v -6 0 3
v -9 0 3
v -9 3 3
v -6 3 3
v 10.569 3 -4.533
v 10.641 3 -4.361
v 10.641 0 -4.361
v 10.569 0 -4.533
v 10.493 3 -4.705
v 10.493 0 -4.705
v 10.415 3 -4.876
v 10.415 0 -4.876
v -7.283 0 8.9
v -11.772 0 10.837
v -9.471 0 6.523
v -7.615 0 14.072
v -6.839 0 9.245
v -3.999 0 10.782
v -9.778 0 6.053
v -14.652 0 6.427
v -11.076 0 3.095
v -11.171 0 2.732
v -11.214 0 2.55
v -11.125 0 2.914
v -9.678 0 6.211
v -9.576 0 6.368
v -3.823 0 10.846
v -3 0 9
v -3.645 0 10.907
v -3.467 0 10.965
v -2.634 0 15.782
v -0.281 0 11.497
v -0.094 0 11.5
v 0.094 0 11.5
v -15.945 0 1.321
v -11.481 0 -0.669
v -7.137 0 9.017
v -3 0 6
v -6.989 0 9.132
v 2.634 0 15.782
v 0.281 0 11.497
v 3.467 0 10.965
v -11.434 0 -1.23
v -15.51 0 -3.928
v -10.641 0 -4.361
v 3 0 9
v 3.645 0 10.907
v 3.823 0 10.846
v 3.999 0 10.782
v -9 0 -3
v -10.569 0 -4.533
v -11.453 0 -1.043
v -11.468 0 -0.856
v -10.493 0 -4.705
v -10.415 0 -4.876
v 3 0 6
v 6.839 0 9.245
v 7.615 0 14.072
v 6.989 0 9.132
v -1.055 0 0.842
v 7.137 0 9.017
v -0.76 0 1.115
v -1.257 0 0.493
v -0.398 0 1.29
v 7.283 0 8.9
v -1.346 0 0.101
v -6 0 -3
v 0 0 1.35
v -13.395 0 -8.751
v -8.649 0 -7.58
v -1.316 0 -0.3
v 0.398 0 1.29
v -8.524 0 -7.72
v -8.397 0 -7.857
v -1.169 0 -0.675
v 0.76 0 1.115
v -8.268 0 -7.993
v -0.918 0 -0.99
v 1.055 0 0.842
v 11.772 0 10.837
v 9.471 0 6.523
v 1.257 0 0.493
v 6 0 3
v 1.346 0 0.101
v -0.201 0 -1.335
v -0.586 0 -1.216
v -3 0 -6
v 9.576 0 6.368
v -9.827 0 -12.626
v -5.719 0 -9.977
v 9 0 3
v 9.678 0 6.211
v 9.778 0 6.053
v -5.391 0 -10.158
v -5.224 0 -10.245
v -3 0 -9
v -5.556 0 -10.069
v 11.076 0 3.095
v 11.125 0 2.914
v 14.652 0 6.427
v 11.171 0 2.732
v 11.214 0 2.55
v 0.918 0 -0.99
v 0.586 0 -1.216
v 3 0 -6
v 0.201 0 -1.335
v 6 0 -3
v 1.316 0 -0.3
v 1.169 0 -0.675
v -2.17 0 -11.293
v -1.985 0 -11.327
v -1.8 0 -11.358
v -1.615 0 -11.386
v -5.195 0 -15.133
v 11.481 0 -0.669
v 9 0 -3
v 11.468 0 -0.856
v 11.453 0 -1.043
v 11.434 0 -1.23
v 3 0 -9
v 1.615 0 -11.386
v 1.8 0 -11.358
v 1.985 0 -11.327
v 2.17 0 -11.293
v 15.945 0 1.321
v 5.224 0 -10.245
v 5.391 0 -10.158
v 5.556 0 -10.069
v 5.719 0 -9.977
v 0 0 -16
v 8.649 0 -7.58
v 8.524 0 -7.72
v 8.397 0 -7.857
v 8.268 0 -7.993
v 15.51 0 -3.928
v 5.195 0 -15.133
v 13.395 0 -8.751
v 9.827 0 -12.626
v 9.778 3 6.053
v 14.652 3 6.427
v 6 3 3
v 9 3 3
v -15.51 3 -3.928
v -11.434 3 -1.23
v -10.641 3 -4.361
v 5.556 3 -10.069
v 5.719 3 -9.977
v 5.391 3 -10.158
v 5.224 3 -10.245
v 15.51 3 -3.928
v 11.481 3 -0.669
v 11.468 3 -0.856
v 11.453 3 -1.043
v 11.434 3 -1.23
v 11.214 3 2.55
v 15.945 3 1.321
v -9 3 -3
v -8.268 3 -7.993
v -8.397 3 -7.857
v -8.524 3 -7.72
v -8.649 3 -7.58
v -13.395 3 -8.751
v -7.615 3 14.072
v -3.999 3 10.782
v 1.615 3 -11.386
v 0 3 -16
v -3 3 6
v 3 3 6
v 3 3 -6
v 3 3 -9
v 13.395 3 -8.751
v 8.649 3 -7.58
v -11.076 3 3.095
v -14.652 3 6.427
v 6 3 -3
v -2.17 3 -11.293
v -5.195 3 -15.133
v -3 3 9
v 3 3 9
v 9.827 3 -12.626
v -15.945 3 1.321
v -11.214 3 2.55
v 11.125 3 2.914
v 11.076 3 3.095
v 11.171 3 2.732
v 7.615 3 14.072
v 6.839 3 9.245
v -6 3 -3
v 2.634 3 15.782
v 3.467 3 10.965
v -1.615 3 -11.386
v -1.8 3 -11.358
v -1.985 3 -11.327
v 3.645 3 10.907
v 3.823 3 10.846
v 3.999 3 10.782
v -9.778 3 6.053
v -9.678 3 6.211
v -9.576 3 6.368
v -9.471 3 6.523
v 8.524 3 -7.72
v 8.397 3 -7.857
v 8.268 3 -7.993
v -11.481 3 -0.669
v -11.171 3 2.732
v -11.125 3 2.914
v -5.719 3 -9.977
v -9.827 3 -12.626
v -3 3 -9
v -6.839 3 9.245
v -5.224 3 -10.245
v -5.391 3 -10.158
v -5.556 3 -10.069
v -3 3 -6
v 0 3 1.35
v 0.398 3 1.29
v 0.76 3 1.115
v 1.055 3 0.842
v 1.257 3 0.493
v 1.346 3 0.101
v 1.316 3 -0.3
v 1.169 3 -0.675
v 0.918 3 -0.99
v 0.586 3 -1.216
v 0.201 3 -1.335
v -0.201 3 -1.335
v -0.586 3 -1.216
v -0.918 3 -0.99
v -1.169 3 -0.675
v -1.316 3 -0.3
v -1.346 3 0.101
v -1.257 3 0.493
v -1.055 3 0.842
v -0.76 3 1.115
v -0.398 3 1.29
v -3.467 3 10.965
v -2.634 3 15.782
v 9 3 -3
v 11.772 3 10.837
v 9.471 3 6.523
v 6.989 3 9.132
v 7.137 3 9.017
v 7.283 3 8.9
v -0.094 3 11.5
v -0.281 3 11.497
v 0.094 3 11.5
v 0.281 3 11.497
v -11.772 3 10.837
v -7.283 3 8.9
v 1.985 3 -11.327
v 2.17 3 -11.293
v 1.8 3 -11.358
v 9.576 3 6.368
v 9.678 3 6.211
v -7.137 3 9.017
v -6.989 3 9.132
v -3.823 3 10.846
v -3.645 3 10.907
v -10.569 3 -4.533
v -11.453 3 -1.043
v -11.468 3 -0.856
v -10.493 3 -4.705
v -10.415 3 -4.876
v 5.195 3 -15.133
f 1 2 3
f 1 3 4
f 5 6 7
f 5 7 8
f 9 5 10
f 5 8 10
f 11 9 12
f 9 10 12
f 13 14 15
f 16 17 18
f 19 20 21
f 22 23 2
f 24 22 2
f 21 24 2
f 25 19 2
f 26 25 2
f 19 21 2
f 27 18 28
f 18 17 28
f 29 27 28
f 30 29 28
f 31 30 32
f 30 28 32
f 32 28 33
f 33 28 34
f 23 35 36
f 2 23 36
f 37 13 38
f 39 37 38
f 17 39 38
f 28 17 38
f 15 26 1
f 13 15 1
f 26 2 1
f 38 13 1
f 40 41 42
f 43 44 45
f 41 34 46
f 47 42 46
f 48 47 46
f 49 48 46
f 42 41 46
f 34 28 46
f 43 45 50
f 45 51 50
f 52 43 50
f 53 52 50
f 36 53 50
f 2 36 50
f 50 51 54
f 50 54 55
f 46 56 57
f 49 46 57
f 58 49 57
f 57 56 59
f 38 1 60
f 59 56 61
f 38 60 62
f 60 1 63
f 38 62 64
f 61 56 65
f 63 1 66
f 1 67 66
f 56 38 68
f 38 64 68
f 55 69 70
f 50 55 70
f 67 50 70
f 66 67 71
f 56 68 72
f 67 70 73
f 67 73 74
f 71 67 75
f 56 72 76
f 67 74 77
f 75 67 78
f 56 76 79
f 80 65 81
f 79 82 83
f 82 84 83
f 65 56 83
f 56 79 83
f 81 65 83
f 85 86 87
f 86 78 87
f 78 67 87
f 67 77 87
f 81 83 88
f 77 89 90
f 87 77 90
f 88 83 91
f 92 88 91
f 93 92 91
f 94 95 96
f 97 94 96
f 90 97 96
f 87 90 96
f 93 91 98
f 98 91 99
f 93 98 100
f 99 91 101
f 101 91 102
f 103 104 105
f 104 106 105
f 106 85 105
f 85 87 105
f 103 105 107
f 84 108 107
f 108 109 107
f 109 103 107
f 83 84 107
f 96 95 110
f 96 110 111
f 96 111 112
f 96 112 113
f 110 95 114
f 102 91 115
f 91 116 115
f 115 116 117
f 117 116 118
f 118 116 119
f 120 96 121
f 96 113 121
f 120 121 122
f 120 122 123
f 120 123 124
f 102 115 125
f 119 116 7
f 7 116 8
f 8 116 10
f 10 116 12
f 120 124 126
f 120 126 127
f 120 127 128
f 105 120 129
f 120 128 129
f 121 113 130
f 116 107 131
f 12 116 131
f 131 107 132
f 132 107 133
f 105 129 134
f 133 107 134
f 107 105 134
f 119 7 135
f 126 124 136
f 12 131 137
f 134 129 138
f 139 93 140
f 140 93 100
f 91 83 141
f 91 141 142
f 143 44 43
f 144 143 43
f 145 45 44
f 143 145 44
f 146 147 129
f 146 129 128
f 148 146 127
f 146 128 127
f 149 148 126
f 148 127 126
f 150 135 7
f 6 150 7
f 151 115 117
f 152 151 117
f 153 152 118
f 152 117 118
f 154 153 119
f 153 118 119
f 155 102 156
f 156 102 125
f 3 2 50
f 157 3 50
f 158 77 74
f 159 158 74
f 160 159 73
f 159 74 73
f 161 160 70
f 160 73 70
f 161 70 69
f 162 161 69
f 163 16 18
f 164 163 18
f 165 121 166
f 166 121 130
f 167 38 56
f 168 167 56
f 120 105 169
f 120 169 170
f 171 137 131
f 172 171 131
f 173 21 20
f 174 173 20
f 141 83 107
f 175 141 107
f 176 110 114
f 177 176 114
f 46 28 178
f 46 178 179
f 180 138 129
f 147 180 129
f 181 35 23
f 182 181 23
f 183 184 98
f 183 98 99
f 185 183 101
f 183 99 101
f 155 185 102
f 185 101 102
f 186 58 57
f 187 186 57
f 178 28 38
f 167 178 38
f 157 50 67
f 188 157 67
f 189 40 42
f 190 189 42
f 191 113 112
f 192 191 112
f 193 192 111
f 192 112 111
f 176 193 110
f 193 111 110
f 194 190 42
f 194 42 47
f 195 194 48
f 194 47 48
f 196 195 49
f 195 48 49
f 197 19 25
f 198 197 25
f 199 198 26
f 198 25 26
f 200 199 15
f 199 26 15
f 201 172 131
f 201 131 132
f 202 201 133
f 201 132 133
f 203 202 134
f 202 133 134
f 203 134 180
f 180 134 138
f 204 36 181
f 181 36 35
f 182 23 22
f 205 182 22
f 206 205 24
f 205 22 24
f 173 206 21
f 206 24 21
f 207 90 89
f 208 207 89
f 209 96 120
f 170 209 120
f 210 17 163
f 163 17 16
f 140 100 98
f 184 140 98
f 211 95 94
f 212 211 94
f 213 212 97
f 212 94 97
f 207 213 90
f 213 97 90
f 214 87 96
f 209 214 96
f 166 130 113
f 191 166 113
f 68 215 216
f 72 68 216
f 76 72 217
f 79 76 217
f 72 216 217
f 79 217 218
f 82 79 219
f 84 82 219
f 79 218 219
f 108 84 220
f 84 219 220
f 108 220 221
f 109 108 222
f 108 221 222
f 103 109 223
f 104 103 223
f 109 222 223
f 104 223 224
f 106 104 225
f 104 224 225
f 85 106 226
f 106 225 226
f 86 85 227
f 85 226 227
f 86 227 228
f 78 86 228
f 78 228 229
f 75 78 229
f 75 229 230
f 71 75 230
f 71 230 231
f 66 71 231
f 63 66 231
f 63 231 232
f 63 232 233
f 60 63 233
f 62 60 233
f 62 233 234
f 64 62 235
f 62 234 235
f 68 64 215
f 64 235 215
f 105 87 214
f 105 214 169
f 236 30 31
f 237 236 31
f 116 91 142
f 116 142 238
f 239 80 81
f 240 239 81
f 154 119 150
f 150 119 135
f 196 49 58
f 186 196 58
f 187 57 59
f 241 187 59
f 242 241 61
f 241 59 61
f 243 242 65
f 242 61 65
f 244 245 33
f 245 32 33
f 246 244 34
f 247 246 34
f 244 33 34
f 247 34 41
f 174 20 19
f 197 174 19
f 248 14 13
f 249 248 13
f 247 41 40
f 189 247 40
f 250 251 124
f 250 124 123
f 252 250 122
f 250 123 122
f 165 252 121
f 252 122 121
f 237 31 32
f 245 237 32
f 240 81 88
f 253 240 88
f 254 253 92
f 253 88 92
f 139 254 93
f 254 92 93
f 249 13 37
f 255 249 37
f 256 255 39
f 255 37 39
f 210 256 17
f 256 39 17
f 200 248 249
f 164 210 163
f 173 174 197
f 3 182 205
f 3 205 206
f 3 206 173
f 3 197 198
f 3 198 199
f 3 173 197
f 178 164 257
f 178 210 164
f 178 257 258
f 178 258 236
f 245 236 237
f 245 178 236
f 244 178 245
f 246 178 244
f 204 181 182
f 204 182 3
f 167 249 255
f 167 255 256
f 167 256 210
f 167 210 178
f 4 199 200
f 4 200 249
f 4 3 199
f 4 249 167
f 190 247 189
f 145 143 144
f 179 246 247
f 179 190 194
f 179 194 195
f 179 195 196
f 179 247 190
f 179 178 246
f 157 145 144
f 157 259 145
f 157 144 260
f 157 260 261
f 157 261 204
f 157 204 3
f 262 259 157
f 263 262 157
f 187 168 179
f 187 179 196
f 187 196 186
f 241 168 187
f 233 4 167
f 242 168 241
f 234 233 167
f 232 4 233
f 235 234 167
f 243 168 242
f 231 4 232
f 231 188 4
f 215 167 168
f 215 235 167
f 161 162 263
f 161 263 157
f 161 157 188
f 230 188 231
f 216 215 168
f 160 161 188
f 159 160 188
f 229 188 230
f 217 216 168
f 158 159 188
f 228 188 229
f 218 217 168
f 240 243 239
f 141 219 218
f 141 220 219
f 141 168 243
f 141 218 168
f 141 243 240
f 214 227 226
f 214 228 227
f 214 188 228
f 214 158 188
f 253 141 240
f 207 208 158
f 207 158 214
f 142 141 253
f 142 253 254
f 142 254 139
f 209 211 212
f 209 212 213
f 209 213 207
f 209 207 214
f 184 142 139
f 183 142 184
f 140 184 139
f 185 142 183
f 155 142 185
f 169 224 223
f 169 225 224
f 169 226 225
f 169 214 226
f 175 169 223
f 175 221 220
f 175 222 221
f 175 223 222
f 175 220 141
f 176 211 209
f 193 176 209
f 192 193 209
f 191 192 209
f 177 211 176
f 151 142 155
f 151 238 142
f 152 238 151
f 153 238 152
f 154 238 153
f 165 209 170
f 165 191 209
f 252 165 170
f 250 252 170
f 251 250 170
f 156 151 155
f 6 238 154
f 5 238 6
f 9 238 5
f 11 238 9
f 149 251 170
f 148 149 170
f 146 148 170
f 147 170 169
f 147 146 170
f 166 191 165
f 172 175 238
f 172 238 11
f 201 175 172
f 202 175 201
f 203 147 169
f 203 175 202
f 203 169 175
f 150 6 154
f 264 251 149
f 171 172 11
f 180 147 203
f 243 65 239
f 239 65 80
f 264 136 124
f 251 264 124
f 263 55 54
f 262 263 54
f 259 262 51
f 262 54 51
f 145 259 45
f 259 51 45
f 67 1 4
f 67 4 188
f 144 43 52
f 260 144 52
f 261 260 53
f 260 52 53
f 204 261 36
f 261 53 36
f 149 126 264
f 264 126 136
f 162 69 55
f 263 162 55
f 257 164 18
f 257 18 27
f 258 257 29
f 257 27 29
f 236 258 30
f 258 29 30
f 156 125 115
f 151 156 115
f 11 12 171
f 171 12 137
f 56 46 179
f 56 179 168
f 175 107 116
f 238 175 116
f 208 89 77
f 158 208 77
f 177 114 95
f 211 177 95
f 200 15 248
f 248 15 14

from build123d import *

# Parameters (mm, degrees)
SKETCH5_R           = 11.5
BOSS_EXTRUDE2_DEPTH = 3
BOSS_EXTRUDE1_DEPTH = 3
SKETCH3_W           = 6
SKETCH3_H           = 3
SKETCH3_W_2         = 3
SKETCH3_H_2         = 6
CUT_EXTRUDE1_DEPTH  = 3
SKETCH6_R           = 1.35
CUT_EXTRUDE3_DEPTH  = 3


with BuildPart() as part:
    # Sketch5 → Boss-Extrude2 (new body)
    with BuildSketch(Plane(origin=(0, 0, 0), x_dir=(1, 0, 0), z_dir=(0, 1, 0))):
        with Locations(Location((0, 0, 0), (0, 0, 270))):
            Circle(SKETCH5_R)
    extrude(amount=BOSS_EXTRUDE2_DEPTH)

    # Sketch1 → Boss-Extrude1 (add)
    with BuildSketch(Plane(origin=(0, 0, 0), x_dir=(1, 0, 0), z_dir=(0, 1, 0))):
        Polygon((0, 16), (-1.75, 11), (1.75, 11), align=None)
        Polygon((5.195191507, 15.133075867), (1.916513988, 10.97221373), (5.226874334, 9.835765588), align=None)
        Polygon((9.827403403, 12.62624815), (5.375343948, 9.755417851), (8.137335731, 7.605673356), align=None)
        Polygon((13.394663652, 8.75117053), (8.251671984, 7.481471076), (10.165990538, 4.551388402), align=None)
        Polygon((15.510404255, 3.927767794), (10.233803323, 4.396790824), (11.093002528, 1.003889893), align=None)
        Polygon((15.945351888, -1.321269528), (11.106943278, 0.835650063), (10.817915568, -2.652395663), align=None)
        Polygon((14.652373226, -6.427126794), (10.776473586, -2.81604635), (9.3705396, -6.021252993), align=None)
        Polygon((11.771582571, -10.836505146), (9.278205768, -6.162580444), (6.907720267, -8.737614132), align=None)
        Polygon((7.615158289, -14.071580019), (6.774500388, -8.841303325), (3.696342259, -10.507119201), align=None)
        Polygon((2.633513444, -15.781780854), (3.536672774, -10.561933804), (0.084408212, -11.13801487), align=None)
        Polygon((-2.633513444, -15.781780854), (-0.084408212, -11.13801487), (-3.536672774, -10.561933804), align=None)
        Polygon((-7.615158289, -14.071580019), (-3.696342259, -10.507119201), (-6.774500388, -8.841303325), align=None)
        Polygon((-11.771582571, -10.836505146), (-6.907720267, -8.737614132), (-9.278205768, -6.162580444), align=None)
        Polygon((-14.652373226, -6.427126794), (-9.3705396, -6.021252993), (-10.776473586, -2.81604635), align=None)
        Polygon((-15.945351888, -1.321269528), (-10.817915568, -2.652395663), (-11.106943278, 0.835650063), align=None)
        Polygon((-15.510404255, 3.927767794), (-11.093002528, 1.003889893), (-10.233803323, 4.396790824), align=None)
        Polygon((-13.394663652, 8.75117053), (-10.165990538, 4.551388402), (-8.251671984, 7.481471076), align=None)
        Polygon((-9.827403403, 12.62624815), (-8.137335731, 7.605673356), (-5.375343948, 9.755417851), align=None)
        Polygon((-5.195191507, 15.133075867), (-5.226874334, 9.835765588), (-1.916513988, 10.97221373), align=None)
    extrude(amount=BOSS_EXTRUDE1_DEPTH)

    # Sketch3 → Cut-Extrude1 (cut)
    with BuildSketch(Plane(origin=(0, 0, 0), x_dir=(1, 0, 0), z_dir=(0, 1, 0))):
        with Locations((0, 7.5)):
            Rectangle(SKETCH3_W, SKETCH3_H)
        with Locations((7.5, 0)):
            Rectangle(SKETCH3_W_2, SKETCH3_H_2)
        with Locations((0, -7.5)):
            Rectangle(SKETCH3_W, SKETCH3_H)
        with Locations((-7.5, 0)):
            Rectangle(SKETCH3_W_2, SKETCH3_H_2)
    extrude(amount=CUT_EXTRUDE1_DEPTH, mode=Mode.SUBTRACT)

    # Sketch6 → Cut-Extrude3 (cut)
    with BuildSketch(Plane(origin=(0, 3, 0), x_dir=(1, 0, 0), z_dir=(0, 1, 0))):
        with Locations(Location((0, 0, 0), (0, 0, 270))):
            Circle(SKETCH6_R)
    extrude(amount=-CUT_EXTRUDE3_DEPTH, mode=Mode.SUBTRACT)


solid = part.part
